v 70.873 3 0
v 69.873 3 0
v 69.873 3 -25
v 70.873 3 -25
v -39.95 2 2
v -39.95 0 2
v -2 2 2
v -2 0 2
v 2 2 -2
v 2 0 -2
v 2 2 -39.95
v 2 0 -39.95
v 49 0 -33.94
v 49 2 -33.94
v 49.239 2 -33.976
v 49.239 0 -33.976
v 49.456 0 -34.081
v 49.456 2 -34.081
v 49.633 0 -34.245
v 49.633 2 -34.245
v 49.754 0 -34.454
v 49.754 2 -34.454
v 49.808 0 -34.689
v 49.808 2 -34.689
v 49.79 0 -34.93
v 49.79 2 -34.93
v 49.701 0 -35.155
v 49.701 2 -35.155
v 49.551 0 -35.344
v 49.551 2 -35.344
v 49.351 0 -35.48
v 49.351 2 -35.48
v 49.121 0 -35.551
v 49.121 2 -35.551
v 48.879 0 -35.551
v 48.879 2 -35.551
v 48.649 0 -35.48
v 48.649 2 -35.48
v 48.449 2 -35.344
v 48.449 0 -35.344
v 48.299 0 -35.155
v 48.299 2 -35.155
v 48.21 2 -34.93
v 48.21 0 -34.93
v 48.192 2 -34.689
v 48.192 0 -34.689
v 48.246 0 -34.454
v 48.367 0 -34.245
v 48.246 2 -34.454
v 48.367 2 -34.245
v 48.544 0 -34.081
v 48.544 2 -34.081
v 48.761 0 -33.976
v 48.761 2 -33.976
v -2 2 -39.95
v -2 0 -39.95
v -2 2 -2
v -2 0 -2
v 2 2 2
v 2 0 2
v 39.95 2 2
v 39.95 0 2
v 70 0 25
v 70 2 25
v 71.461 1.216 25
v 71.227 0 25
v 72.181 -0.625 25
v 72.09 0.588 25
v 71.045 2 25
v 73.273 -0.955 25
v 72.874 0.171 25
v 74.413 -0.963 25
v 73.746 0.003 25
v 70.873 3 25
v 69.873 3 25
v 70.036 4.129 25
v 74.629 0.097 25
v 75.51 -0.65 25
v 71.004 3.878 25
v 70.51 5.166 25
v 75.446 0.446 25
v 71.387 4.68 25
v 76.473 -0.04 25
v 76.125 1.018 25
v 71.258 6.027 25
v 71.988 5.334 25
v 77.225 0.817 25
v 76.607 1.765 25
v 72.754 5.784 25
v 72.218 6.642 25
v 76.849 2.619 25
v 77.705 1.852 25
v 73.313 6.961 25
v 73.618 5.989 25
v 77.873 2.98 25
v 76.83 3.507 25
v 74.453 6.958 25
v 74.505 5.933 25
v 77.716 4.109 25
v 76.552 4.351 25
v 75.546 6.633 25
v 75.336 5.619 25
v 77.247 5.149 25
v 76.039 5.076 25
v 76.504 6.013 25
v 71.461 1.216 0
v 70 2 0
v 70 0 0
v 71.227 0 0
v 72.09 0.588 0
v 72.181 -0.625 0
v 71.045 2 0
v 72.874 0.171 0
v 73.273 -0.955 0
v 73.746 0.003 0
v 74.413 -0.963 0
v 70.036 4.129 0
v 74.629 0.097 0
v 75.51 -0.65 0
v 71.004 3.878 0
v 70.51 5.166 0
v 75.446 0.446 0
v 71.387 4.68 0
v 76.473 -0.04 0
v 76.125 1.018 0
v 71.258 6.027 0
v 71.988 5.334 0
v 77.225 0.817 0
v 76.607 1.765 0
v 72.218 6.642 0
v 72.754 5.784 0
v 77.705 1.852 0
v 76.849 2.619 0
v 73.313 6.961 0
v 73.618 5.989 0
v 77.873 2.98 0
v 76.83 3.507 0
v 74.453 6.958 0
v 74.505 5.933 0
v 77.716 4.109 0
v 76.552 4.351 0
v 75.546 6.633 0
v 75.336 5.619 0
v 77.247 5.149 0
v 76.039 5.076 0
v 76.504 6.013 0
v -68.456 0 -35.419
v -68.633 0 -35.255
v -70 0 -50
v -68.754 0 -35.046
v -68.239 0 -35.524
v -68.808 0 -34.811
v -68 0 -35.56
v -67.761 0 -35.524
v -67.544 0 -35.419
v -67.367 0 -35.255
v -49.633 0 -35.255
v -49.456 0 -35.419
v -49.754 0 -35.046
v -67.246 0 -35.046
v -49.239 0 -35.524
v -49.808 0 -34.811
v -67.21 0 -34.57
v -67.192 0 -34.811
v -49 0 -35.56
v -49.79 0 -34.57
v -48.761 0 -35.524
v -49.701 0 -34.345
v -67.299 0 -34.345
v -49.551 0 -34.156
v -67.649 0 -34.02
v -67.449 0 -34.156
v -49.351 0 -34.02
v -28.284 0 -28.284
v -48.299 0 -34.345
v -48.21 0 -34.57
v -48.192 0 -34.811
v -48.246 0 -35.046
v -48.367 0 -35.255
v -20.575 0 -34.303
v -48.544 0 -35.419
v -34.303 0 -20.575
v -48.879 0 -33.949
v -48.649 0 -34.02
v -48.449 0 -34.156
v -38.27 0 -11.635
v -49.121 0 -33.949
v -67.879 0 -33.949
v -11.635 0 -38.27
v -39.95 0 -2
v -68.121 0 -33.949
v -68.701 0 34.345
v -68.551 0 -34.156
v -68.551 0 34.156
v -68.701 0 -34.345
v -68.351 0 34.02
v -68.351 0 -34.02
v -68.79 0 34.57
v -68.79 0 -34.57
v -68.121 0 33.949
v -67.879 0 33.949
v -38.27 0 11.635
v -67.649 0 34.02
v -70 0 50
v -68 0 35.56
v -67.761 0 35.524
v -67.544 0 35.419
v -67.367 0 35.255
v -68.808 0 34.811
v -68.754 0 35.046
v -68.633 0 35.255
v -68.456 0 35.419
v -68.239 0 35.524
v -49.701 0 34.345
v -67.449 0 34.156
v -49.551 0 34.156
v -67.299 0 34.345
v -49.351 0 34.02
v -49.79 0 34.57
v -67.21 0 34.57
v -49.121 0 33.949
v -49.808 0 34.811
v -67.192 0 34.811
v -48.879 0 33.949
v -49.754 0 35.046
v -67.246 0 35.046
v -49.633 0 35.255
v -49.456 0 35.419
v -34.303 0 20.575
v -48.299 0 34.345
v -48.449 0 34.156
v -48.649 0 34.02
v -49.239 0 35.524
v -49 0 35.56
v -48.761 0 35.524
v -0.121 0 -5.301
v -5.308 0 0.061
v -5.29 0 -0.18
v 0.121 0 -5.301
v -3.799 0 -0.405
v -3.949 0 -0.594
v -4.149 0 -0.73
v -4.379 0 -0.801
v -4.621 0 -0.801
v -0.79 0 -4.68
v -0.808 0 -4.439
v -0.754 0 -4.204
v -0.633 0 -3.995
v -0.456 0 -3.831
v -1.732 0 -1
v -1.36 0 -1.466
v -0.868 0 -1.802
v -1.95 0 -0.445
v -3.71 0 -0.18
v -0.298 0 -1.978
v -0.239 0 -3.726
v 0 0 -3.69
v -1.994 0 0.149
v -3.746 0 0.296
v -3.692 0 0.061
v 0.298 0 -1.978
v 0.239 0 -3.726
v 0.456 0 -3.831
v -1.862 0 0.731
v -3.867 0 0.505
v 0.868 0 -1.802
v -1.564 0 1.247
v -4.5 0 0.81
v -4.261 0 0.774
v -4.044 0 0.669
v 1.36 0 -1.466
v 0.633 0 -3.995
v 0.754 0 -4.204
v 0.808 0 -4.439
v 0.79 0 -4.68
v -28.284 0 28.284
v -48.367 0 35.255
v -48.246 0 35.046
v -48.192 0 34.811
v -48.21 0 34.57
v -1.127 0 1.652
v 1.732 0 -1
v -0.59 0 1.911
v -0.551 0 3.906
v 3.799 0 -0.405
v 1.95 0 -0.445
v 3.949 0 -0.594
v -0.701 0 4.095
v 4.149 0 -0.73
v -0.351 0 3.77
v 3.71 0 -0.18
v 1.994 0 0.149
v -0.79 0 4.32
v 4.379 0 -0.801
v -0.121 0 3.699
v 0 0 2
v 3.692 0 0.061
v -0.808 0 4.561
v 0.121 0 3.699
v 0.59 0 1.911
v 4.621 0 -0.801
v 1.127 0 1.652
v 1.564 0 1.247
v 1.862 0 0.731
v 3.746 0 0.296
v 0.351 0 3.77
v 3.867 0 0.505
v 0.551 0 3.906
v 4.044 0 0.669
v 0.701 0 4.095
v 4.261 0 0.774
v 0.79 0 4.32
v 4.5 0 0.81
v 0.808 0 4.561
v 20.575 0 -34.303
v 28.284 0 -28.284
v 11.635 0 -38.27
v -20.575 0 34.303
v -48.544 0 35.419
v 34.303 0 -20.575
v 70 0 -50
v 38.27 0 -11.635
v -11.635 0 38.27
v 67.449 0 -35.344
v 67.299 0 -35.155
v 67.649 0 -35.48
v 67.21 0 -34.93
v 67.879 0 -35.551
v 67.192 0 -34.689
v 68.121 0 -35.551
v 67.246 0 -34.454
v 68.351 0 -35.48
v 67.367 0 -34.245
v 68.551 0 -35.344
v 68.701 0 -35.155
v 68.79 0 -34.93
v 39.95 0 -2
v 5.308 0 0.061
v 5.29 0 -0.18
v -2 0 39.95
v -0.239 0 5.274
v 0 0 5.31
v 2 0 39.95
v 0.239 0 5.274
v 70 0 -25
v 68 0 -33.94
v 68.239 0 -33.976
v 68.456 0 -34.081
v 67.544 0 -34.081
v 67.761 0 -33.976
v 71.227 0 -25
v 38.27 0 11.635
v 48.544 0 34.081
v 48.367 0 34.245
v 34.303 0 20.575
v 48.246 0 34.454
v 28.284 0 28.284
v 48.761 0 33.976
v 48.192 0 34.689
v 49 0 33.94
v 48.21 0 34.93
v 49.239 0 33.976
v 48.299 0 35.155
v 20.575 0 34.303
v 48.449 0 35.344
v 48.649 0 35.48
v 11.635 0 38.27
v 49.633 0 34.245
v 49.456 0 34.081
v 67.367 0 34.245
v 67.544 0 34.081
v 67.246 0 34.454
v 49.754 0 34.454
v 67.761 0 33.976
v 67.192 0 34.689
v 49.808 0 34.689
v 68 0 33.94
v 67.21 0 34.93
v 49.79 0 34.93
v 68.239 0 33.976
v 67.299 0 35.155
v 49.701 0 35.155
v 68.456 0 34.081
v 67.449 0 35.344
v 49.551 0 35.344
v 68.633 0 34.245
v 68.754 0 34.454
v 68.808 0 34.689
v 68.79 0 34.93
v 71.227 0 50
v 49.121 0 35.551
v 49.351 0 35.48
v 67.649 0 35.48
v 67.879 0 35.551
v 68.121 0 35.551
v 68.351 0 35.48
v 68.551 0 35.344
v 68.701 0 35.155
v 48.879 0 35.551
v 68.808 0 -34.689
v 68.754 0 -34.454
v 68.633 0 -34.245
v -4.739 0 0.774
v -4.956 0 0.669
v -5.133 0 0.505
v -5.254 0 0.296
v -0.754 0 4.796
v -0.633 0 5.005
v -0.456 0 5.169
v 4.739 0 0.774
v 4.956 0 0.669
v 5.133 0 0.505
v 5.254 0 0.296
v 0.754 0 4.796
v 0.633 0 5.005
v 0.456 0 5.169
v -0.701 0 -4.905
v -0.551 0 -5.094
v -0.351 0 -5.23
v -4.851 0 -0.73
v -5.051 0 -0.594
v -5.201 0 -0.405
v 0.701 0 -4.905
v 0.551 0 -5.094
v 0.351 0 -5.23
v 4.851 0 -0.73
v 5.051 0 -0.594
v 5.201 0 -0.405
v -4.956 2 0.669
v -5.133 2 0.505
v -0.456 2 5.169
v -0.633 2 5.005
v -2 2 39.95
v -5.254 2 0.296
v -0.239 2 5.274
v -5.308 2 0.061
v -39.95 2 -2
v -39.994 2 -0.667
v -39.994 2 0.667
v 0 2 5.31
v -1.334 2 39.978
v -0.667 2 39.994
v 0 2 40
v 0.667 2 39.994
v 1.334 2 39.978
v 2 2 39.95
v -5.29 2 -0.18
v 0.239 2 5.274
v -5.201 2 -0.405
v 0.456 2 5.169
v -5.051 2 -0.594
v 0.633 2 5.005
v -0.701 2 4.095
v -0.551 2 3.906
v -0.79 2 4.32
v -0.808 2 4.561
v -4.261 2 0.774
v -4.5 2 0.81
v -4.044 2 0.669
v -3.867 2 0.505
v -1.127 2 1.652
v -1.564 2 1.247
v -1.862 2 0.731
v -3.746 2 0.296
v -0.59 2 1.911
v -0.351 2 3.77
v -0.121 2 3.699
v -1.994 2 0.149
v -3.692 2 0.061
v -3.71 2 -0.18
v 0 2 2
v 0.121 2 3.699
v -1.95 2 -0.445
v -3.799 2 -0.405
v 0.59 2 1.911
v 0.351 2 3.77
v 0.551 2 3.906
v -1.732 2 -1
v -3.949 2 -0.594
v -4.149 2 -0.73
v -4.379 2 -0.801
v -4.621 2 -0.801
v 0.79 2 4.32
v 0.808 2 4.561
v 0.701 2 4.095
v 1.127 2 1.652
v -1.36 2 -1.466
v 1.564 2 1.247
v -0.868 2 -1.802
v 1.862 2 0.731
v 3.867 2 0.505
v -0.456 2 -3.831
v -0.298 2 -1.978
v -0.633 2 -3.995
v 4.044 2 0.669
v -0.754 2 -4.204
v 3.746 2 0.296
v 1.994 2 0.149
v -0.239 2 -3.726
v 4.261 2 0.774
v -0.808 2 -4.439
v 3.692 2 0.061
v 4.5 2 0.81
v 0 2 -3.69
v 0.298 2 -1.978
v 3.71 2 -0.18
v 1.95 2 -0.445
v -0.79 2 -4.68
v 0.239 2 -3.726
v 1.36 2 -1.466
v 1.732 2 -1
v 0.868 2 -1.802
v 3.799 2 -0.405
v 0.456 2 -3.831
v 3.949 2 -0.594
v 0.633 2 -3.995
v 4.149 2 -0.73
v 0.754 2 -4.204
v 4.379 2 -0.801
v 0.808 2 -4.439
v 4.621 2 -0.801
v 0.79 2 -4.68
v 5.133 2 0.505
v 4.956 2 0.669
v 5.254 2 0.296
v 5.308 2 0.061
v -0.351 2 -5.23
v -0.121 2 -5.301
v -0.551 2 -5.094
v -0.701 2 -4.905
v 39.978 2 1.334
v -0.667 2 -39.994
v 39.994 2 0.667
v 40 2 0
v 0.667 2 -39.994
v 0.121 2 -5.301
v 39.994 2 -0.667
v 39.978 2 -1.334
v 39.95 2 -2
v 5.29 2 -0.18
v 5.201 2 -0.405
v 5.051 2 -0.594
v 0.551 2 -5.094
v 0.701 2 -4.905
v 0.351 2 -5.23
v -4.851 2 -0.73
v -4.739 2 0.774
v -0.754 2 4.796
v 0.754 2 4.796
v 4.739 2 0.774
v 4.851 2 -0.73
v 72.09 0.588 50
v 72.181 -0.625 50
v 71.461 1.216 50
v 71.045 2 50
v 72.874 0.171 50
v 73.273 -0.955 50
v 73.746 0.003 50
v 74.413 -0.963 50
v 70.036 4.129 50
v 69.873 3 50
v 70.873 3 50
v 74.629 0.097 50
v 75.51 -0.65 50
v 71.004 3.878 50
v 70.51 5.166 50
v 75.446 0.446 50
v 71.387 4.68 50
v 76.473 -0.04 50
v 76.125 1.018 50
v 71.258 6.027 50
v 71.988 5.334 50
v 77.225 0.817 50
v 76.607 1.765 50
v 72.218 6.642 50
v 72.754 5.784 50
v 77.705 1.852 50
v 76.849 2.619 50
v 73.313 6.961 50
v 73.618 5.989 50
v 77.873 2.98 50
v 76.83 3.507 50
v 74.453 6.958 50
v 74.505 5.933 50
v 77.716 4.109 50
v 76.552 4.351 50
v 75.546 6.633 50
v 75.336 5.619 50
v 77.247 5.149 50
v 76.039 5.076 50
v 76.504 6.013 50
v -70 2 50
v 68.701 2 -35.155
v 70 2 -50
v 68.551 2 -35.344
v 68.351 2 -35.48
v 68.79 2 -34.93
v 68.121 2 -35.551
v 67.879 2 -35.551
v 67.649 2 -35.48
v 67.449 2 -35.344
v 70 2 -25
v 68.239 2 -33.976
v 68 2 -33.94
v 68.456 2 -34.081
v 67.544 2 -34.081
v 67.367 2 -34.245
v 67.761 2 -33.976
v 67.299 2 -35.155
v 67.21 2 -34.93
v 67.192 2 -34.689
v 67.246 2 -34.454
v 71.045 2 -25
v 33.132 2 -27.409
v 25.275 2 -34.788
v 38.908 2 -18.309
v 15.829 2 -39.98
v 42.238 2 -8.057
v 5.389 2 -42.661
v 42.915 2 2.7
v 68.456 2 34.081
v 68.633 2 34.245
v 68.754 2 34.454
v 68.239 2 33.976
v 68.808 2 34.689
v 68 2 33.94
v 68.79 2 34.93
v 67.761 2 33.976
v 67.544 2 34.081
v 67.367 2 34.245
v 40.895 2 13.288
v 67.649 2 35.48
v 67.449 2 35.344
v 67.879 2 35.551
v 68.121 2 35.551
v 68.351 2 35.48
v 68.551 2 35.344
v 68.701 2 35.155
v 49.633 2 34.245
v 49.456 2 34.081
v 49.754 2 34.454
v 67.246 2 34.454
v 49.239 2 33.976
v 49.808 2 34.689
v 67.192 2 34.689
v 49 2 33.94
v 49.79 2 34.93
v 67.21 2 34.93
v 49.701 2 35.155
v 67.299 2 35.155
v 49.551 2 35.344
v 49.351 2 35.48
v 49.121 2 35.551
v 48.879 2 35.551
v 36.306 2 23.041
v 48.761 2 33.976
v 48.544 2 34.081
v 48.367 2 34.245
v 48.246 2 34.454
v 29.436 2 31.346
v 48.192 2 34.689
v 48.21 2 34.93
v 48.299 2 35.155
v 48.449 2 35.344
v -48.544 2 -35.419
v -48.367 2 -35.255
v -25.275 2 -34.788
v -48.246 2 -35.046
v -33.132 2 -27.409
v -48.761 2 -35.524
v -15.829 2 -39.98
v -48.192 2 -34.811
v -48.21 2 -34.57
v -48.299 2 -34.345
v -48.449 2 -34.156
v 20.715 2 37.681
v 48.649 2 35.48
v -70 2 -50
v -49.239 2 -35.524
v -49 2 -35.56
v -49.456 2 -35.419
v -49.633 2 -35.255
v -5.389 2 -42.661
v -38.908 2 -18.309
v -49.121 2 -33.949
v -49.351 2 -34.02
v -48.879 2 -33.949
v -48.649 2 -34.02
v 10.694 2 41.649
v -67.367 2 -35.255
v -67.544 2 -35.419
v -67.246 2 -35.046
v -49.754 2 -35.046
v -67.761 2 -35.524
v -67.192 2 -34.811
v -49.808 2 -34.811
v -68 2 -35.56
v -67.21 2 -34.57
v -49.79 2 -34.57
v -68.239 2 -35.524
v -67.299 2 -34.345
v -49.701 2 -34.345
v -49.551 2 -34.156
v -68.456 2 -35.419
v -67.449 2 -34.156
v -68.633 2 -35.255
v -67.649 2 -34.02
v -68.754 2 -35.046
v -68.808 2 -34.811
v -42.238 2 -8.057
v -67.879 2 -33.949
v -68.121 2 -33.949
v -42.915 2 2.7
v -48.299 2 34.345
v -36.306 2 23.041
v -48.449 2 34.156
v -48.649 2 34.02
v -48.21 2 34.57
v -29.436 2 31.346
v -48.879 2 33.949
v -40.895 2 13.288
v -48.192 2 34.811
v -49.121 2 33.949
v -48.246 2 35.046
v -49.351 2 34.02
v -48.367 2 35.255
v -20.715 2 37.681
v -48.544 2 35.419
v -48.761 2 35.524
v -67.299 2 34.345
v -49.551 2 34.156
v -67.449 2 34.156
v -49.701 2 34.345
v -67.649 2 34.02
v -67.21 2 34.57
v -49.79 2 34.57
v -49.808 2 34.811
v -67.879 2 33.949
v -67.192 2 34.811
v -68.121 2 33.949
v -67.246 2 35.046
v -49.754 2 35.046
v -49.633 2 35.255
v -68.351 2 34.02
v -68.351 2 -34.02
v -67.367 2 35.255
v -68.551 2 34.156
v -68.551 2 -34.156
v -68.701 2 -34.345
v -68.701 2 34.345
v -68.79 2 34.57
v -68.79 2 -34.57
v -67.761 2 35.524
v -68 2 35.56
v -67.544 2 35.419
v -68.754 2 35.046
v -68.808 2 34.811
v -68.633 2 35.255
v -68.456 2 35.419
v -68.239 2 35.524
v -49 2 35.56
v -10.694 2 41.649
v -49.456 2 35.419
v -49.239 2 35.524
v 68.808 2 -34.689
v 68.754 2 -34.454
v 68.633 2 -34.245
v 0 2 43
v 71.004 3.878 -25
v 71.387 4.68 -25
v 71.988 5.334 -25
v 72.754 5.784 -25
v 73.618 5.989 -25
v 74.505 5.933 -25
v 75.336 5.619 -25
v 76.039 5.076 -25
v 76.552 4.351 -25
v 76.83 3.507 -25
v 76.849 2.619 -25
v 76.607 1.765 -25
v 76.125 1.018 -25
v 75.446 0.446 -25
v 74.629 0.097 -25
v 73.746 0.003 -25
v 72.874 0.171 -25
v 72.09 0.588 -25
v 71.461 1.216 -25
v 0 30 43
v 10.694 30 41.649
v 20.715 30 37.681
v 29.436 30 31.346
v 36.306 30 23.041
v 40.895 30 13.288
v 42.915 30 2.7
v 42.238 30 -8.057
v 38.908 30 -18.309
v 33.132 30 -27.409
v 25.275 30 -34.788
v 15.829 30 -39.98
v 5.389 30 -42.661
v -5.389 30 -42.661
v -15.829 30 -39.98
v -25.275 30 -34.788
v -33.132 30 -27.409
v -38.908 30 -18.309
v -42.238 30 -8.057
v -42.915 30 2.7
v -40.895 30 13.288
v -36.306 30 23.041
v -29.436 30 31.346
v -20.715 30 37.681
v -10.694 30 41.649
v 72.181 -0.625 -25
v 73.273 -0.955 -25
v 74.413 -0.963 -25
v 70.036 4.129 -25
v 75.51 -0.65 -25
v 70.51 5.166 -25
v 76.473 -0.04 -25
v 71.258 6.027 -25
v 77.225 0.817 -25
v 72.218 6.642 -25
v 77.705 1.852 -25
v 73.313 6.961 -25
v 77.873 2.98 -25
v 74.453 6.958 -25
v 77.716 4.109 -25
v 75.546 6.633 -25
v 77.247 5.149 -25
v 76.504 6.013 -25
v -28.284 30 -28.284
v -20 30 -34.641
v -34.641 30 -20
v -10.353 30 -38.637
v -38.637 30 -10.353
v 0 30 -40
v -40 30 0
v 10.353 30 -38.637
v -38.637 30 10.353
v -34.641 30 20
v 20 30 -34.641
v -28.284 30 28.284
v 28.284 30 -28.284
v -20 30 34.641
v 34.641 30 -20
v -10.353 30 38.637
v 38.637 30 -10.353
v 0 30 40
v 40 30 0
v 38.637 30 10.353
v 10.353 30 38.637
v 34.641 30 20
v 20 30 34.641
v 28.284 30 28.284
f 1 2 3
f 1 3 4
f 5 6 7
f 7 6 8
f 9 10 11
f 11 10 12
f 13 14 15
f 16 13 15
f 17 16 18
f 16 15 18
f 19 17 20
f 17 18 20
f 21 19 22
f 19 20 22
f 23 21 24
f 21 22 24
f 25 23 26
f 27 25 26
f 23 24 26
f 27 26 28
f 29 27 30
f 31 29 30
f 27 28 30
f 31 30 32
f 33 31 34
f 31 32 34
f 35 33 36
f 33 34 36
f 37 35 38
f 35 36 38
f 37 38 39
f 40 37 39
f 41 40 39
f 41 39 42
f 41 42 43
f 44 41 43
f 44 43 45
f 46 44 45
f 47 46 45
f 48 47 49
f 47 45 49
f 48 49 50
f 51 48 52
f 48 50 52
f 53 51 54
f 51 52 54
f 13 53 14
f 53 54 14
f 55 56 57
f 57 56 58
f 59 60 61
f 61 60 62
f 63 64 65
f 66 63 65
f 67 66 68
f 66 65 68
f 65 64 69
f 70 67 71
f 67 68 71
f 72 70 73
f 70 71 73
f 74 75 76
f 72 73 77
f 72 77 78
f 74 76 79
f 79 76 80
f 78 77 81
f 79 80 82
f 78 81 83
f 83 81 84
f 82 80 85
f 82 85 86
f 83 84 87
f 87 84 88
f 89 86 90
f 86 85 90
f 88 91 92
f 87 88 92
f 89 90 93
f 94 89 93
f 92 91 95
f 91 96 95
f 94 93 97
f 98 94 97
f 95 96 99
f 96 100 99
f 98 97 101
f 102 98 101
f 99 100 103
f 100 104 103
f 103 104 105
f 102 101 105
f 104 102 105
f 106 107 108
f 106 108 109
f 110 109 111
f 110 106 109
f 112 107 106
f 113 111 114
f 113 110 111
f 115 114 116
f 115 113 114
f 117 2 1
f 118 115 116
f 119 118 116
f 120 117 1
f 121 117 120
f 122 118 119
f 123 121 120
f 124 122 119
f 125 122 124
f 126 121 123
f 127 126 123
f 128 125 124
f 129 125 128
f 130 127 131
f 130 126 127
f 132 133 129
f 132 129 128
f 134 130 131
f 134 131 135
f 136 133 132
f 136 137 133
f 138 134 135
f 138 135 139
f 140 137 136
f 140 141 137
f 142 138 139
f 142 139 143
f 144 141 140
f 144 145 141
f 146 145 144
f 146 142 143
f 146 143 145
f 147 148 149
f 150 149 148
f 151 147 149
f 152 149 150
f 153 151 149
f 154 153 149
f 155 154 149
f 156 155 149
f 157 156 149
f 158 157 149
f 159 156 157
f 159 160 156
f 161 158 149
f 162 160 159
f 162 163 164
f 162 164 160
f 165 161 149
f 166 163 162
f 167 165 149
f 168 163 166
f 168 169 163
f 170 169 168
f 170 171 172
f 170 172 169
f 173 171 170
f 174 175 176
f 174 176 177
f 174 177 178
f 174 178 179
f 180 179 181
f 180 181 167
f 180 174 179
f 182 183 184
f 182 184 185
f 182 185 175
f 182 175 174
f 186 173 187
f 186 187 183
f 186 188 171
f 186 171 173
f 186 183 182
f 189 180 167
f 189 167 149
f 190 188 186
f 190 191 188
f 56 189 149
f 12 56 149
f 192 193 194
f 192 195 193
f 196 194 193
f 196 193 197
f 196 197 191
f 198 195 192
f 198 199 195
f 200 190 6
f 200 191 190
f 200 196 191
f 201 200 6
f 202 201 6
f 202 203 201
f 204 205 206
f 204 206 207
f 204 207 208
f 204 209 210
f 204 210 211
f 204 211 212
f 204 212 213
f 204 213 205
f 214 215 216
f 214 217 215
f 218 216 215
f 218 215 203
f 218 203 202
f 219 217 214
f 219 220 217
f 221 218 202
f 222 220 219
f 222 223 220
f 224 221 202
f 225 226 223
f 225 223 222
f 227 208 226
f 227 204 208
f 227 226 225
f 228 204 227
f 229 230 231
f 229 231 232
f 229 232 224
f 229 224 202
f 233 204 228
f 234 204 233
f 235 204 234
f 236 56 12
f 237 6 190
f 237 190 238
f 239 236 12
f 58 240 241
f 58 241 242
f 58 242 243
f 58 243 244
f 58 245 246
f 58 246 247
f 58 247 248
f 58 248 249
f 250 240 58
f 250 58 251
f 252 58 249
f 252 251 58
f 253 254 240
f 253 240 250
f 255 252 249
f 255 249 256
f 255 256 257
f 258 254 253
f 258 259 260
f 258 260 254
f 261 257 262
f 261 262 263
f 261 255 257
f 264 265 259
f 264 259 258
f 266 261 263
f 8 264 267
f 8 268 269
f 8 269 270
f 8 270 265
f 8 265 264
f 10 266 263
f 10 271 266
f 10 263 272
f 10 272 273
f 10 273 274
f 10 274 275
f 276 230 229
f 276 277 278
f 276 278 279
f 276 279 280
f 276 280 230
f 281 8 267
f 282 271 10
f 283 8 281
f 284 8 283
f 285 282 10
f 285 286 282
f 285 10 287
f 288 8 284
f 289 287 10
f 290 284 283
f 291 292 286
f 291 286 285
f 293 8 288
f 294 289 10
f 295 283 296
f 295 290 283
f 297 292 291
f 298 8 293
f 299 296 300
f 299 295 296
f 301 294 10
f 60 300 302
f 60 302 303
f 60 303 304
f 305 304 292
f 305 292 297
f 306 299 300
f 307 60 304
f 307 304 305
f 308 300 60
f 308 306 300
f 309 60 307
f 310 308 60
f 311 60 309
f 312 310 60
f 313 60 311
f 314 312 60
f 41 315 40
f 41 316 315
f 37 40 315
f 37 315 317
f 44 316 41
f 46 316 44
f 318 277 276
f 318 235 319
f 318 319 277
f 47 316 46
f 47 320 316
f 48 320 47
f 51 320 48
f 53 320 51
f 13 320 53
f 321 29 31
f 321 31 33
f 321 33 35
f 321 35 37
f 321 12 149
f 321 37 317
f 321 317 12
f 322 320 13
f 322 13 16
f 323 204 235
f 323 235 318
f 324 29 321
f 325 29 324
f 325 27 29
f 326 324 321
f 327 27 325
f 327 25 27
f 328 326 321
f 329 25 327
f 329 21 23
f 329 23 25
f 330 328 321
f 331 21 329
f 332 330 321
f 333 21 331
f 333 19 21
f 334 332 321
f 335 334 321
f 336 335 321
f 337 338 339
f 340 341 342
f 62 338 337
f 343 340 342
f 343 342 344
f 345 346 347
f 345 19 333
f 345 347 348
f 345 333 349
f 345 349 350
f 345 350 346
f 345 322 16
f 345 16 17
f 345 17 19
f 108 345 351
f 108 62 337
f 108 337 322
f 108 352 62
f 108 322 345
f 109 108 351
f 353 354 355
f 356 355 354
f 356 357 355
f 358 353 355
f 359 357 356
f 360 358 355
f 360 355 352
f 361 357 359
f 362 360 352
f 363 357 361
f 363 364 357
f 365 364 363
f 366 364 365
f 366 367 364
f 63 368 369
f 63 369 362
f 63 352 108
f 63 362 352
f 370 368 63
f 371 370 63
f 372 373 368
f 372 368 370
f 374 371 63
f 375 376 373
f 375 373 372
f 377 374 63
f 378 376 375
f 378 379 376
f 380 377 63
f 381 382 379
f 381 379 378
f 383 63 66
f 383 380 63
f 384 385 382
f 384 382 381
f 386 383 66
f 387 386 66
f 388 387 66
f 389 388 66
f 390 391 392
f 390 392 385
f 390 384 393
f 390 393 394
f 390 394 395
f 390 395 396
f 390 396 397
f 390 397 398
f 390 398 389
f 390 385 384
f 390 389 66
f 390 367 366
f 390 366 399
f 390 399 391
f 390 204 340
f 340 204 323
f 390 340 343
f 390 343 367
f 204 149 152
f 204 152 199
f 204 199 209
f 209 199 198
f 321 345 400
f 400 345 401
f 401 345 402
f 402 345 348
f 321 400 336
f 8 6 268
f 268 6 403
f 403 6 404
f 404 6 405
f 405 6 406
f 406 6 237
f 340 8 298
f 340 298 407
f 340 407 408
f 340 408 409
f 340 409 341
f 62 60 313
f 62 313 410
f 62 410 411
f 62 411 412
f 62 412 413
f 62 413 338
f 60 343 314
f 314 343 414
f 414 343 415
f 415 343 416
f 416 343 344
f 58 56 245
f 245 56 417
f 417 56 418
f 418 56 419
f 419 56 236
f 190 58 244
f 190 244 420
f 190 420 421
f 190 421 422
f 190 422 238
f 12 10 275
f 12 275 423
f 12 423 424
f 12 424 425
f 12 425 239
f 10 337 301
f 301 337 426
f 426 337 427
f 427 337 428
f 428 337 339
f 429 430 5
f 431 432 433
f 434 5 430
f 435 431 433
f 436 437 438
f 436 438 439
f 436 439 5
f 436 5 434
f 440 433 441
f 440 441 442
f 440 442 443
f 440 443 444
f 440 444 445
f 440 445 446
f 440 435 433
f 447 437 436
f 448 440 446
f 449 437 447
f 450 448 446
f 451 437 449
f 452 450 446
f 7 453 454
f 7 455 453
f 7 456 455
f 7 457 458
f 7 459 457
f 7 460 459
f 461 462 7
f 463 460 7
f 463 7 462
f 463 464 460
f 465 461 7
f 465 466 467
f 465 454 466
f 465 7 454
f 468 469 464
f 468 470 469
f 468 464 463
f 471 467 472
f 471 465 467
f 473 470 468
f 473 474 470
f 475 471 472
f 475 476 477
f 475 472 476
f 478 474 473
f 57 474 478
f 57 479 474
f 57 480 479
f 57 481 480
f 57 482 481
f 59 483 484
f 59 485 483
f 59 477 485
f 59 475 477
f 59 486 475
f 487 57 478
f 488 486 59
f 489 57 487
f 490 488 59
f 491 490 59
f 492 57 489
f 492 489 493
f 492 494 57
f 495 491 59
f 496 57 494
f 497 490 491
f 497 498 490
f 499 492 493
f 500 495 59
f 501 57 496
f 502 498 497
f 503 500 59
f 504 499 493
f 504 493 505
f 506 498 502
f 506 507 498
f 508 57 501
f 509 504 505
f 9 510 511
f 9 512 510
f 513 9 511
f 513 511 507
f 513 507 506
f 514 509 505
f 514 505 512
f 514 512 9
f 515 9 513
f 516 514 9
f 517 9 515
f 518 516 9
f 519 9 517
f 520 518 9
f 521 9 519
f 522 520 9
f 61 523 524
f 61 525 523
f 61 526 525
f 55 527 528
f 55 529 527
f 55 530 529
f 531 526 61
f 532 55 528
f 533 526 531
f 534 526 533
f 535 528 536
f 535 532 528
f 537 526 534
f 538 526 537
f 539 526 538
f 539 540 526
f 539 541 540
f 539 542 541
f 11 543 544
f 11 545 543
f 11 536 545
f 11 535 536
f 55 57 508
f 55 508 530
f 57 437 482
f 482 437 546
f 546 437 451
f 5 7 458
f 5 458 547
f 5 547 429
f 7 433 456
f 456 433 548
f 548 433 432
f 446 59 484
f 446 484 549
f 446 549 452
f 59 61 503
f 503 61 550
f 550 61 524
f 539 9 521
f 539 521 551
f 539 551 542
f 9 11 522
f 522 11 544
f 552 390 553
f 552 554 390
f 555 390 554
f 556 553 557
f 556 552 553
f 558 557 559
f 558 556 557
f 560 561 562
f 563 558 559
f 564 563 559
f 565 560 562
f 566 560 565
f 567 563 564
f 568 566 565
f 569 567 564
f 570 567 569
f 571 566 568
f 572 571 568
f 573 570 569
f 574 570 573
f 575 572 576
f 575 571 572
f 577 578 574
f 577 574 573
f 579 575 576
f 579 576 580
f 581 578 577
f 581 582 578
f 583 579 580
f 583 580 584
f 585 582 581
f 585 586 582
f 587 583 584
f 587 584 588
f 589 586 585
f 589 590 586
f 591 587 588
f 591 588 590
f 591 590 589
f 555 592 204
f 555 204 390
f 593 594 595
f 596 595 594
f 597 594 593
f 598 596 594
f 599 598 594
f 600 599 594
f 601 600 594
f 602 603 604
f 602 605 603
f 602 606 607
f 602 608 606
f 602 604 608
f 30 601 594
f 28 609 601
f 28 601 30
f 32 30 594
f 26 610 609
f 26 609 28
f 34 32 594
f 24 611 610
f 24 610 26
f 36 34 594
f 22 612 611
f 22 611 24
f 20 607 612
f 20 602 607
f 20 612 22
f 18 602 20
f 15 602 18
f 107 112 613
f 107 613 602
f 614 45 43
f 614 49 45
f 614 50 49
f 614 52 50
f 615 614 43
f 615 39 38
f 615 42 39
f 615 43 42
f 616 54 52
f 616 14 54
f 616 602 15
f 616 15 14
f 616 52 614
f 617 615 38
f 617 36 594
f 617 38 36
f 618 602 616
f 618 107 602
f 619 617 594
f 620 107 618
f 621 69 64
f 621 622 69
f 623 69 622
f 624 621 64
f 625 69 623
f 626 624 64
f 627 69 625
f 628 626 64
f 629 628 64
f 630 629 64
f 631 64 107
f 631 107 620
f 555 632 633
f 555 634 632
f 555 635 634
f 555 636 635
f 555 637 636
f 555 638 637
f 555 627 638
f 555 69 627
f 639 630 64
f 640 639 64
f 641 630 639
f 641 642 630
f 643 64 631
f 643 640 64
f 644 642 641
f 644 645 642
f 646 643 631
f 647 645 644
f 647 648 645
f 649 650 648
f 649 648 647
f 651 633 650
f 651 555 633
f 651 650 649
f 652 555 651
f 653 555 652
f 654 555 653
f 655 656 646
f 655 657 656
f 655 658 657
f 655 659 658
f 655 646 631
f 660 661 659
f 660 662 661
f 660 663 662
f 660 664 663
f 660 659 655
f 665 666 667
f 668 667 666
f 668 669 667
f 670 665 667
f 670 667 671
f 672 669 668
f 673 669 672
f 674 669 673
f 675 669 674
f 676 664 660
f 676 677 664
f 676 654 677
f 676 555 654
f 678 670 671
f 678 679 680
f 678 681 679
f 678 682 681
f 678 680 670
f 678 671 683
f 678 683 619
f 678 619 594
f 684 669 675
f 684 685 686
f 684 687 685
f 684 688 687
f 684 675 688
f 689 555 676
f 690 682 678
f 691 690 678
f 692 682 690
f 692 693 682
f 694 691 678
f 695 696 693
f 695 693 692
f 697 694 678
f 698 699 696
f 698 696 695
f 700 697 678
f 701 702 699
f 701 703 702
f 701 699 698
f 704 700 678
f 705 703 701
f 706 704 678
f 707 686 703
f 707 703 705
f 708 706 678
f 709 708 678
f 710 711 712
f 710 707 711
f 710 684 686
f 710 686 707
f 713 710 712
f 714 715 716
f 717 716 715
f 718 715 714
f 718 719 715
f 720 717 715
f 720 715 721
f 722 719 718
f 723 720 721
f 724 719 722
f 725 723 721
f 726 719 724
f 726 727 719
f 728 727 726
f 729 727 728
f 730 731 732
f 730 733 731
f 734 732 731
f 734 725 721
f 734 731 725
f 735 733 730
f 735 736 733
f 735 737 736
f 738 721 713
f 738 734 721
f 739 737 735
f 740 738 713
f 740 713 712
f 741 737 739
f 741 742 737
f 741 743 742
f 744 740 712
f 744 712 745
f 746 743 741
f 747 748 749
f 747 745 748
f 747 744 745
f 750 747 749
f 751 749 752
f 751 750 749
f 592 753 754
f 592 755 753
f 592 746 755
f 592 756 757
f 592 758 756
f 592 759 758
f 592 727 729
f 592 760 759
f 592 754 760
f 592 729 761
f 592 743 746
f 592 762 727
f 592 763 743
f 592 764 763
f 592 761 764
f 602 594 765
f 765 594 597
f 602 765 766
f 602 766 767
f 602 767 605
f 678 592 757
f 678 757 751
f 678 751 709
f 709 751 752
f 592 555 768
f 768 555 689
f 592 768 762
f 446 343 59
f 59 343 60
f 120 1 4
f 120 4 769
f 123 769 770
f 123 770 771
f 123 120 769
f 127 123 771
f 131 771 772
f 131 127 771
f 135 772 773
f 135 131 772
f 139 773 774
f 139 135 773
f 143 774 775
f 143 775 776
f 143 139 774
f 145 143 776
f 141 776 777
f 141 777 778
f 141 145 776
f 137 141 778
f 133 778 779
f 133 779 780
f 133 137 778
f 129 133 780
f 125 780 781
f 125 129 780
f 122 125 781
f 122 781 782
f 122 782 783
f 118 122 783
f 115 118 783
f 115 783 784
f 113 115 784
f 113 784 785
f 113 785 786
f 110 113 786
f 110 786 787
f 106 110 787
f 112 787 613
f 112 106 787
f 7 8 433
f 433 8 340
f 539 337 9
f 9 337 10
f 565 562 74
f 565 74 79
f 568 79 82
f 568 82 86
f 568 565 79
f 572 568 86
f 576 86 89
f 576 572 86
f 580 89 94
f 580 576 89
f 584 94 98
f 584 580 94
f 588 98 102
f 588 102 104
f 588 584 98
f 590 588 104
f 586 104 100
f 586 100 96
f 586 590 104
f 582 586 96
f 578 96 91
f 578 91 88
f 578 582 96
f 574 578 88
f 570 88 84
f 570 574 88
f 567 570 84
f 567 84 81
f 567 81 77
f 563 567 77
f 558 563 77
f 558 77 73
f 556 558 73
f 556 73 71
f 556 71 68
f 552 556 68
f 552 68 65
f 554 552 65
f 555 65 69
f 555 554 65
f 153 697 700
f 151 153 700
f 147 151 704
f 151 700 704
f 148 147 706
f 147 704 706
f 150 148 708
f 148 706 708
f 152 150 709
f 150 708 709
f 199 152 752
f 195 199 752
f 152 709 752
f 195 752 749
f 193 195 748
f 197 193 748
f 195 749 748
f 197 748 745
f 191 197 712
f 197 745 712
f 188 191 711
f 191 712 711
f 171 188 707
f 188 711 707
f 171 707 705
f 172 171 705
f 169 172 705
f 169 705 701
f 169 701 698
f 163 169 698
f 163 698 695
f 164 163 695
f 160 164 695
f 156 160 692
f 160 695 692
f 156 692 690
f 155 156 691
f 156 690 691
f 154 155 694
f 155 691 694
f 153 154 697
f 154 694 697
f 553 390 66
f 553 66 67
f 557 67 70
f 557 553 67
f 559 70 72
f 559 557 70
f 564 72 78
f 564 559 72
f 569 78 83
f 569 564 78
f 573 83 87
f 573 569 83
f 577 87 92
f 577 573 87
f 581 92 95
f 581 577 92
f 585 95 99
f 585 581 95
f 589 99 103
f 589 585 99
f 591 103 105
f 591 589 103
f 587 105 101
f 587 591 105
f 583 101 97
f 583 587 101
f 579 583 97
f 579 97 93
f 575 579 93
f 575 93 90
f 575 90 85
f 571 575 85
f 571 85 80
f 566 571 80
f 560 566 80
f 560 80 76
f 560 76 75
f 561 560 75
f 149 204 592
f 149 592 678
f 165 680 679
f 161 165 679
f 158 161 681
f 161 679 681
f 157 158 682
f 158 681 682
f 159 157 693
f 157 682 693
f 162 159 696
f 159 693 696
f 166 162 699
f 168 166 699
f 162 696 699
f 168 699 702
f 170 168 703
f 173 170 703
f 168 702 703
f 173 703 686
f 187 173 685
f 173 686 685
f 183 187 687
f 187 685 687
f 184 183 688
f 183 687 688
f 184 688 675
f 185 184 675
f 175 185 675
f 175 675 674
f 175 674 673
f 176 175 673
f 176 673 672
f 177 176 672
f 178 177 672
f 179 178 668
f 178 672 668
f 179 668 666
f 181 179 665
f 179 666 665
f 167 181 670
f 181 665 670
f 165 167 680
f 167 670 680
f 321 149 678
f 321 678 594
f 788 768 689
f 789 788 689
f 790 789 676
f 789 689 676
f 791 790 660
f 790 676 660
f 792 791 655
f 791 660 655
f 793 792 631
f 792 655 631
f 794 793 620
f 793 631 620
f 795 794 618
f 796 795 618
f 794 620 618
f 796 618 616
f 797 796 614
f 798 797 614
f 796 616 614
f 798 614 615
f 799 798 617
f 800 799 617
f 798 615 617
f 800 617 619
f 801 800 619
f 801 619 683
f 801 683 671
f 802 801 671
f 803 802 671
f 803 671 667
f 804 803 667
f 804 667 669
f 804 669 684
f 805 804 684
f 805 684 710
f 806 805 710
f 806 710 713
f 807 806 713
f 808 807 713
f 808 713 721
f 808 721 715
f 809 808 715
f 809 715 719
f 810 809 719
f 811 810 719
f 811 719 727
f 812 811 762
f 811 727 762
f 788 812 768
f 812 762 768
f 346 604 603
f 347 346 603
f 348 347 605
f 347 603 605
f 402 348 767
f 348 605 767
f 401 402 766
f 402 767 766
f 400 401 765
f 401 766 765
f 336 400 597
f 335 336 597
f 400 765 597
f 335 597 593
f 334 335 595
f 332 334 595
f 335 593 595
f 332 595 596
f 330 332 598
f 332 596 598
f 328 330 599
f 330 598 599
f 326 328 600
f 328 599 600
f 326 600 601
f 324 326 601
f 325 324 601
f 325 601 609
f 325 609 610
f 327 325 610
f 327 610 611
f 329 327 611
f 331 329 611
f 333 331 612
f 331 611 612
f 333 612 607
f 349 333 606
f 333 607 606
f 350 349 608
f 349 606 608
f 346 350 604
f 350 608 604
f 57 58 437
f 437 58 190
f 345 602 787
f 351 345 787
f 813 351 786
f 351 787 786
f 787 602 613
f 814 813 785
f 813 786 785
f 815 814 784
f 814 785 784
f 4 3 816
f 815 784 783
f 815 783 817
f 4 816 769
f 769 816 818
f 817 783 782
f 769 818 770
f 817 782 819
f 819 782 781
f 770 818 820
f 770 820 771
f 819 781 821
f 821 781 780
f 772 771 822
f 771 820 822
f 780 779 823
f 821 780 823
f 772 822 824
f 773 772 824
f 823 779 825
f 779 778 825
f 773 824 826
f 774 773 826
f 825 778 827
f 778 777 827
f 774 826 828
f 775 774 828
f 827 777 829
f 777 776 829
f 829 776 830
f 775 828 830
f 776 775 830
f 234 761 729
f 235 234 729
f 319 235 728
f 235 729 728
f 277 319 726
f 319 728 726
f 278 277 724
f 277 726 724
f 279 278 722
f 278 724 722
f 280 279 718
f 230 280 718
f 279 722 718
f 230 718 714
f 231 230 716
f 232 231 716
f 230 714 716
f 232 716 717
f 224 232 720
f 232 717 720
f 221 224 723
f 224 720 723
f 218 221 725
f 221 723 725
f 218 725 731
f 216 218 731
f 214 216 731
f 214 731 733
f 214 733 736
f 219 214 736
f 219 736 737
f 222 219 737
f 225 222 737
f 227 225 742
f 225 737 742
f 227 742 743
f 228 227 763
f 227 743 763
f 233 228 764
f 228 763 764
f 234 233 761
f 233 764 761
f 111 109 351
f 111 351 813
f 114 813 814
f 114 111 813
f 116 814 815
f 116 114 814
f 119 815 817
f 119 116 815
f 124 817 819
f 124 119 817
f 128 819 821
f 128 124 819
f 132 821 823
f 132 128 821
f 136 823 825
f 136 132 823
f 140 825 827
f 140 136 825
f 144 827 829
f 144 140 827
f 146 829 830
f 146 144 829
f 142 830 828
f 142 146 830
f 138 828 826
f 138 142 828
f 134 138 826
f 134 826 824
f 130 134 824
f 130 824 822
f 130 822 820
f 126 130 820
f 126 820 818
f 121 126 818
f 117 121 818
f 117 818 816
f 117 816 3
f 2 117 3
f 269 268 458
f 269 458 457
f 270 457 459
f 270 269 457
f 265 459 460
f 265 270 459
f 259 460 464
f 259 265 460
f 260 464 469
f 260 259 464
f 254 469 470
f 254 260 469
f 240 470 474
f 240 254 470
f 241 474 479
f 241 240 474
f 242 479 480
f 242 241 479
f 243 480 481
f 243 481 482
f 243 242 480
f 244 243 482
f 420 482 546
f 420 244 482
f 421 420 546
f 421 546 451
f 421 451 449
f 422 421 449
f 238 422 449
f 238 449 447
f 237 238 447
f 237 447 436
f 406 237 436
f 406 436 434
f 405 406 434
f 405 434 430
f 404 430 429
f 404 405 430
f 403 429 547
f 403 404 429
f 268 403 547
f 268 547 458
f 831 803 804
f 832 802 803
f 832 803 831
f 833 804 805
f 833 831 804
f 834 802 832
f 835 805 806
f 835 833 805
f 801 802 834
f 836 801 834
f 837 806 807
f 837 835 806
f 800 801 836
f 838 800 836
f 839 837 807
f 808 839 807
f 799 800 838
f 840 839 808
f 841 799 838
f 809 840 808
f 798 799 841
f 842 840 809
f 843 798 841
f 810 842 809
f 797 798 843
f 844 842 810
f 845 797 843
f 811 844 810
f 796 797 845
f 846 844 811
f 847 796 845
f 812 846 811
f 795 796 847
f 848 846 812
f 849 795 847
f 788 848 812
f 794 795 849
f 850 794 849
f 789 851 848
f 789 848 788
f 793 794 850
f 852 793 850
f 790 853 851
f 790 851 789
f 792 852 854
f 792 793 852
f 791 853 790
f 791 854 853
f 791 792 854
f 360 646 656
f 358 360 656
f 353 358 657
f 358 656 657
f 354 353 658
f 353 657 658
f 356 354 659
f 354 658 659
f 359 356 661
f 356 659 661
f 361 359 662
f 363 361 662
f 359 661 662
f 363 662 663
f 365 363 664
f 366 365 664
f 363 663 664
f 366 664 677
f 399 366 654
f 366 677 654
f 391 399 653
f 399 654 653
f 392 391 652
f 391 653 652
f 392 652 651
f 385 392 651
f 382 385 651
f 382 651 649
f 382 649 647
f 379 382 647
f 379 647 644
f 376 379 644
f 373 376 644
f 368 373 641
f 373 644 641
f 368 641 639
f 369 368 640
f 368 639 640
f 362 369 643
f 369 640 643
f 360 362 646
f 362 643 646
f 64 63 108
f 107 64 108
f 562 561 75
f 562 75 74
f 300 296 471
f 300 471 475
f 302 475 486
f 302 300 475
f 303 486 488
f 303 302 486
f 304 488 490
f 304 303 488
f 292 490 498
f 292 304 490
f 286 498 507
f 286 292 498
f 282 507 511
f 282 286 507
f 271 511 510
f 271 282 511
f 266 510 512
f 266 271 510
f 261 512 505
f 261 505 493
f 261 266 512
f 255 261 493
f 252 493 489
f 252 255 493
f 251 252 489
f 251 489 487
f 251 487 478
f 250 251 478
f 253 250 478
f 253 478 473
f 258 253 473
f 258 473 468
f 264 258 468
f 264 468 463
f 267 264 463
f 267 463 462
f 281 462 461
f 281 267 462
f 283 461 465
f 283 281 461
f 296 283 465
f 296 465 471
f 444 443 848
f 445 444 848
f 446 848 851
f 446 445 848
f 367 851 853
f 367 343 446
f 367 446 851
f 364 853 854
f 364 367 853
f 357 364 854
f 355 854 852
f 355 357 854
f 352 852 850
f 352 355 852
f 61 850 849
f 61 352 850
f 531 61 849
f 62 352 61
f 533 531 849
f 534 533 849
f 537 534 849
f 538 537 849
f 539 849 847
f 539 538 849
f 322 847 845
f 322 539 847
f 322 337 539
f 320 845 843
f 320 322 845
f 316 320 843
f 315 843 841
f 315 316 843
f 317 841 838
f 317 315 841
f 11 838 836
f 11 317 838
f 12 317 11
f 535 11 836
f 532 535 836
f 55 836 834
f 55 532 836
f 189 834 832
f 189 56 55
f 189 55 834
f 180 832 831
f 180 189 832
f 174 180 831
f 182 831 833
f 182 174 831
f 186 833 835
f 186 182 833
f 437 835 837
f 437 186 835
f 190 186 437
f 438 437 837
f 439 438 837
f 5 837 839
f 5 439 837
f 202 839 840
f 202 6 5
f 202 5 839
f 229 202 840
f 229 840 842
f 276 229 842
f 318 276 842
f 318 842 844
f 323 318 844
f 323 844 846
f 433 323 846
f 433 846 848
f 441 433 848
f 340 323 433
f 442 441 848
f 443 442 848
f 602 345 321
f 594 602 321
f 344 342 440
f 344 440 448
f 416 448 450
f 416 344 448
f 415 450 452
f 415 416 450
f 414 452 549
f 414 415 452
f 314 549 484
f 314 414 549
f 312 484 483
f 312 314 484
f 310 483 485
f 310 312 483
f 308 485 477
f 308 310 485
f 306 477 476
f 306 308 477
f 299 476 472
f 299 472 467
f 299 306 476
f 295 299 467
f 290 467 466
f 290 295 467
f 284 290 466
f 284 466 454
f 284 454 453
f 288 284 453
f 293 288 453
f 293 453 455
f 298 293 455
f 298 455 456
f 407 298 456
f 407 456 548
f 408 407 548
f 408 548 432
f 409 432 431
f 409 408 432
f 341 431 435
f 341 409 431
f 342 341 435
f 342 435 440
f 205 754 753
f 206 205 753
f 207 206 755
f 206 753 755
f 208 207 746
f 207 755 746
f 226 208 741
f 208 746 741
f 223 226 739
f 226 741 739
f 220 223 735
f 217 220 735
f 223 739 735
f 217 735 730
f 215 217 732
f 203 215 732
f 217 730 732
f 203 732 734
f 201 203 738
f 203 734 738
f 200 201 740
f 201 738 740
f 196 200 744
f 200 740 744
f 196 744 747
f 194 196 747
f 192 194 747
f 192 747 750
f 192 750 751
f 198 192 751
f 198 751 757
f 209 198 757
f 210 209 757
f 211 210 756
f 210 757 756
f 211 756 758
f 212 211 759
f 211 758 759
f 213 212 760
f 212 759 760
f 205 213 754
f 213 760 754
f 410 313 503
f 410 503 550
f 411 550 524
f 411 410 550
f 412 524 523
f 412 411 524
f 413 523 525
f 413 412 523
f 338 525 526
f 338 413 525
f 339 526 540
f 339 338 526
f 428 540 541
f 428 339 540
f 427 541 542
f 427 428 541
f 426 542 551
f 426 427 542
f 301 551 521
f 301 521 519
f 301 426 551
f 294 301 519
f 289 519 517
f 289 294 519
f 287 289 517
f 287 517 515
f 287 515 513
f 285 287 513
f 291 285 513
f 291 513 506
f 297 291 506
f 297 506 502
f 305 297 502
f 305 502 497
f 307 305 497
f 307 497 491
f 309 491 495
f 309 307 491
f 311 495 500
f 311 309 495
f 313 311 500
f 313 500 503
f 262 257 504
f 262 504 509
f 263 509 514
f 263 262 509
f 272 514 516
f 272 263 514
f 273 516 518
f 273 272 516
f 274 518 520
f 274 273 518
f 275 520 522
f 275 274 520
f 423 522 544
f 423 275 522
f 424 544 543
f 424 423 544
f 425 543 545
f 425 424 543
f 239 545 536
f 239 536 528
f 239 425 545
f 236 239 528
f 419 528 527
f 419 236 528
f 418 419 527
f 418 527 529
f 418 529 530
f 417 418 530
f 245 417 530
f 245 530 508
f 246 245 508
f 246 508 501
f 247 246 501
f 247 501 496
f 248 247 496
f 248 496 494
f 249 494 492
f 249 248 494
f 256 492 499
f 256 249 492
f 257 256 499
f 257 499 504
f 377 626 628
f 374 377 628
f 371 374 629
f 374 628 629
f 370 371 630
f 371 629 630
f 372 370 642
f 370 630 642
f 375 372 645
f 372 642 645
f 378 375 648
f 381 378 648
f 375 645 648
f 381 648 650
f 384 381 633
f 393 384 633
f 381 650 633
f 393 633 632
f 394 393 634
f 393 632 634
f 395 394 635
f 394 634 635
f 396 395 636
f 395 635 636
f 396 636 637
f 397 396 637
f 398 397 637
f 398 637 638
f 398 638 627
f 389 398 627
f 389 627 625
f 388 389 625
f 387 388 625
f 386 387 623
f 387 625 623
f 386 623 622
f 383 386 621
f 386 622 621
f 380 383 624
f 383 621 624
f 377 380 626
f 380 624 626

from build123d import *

# Parameters (mm, degrees)
CROQUIS1_R              = 43
CROQUIS1_R_2            = 40
SALIENTE_EXTRUIR1_DEPTH = 30
CROQUIS3_R              = 0.81
CROQUIS3_R_2            = 2
SALIENTE_EXTRUIR2_DEPTH = 2
CROQUIS4_W              = 140
CROQUIS4_H              = 100
CROQUIS4_R              = 43
SALIENTE_EXTRUIR3_DEPTH = 2
CROQUIS5_R              = 0.81
CORTAR_EXTRUIR1_DEPTH   = 2
SALIENTE_EXTRUIR7_DEPTH = 25
MATRIZL1_COUNT          = 2
MATRIZL1_PITCH          = 50


with BuildPart() as part:
    # Croquis1 → Saliente-Extruir1 (new body)
    with BuildSketch(Plane(origin=(0, 0, 0), x_dir=(1, 0, 0), z_dir=(0, 1, 0))):
        with Locations(Location((0, 0, 0), (0, 0, 270))):
            Circle(CROQUIS1_R)
        with Locations(Location((0, 0, 0), (0, 0, 270))):
            Circle(CROQUIS1_R_2, mode=Mode.SUBTRACT)
    extrude(amount=SALIENTE_EXTRUIR1_DEPTH)

    # Croquis3 → Saliente-Extruir2 (add)
    with BuildSketch(Plane(origin=(0, 0, 0), x_dir=(1, 0, 0), z_dir=(0, 1, 0))):
        with BuildLine():
            Line((-2, 39.949968711), (-2, 2))
            Line((-2, 2), (-39.949968711, 2))
            ThreePointArc((-39.949968711, 2), (-40, 0), (-39.949968711, -2))
            Line((-39.949968711, -2), (-2, -2))
            Line((-2, -2), (-2, -39.949968711))
            ThreePointArc((-2, -39.949968711), (0, -40), (2, -39.949968711))
            Line((2, -39.949968711), (2, -2))
            Line((2, -2), (39.949968711, -2))
            ThreePointArc((39.949968711, -2), (39.987490222, -1.000312842), (40, 0))
            ThreePointArc((40, 0), (39.987490222, 1.000312842), (39.949968711, 2))
            Line((39.949968711, 2), (2, 2))
            Line((2, 2), (2, 39.949968711))
            ThreePointArc((2, 39.949968711), (0, 40), (-2, 39.949968711))
        make_face()
        with Locations(Location((0, -4.5, 0), (0, 0, 270))):
            Circle(CROQUIS3_R, mode=Mode.SUBTRACT)
        with Locations(Location((-4.5, 0, 0), (0, 0, 270))):
            Circle(CROQUIS3_R, mode=Mode.SUBTRACT)
        with Locations(Location((0, 0, 0), (0, 0, 270))):
            Circle(CROQUIS3_R_2, mode=Mode.SUBTRACT)
        with Locations(Location((4.5, 0, 0), (0, 0, 270))):
            Circle(CROQUIS3_R, mode=Mode.SUBTRACT)
        with Locations(Location((0, 4.5, 0), (0, 0, 270))):
            Circle(CROQUIS3_R, mode=Mode.SUBTRACT)
    extrude(amount=SALIENTE_EXTRUIR2_DEPTH)

    # Croquis4 → Saliente-Extruir3 (add)
    with BuildSketch(Plane(origin=(0, 0, 0), x_dir=(1, 0, 0), z_dir=(0, 1, 0))):
        Rectangle(CROQUIS4_W, CROQUIS4_H)
        with Locations(Location((0, 0, 0), (0, 0, 90))):
            Circle(CROQUIS4_R, mode=Mode.SUBTRACT)
    extrude(amount=SALIENTE_EXTRUIR3_DEPTH)

    # Croquis5 → Cortar-Extruir1 (cut)
    with BuildSketch(Plane(origin=(0, 2, 0), x_dir=(1, 0, 0), z_dir=(0, 1, 0))):
        with Locations(Location((-68, -34.75, 0), (0, 0, 270))):
            Circle(CROQUIS5_R)
        with Locations(Location((-49, -34.75, 0), (0, 0, 270))):
            Circle(CROQUIS5_R)
        with Locations(Location((-49, 34.75, 0), (0, 0, 90))):
            Circle(CROQUIS5_R)
        with Locations(Location((-68, 34.75, 0), (0, 0, 90))):
            Circle(CROQUIS5_R)
        with Locations(Location((68, 34.75, 0), (0, 0, 270))):
            Circle(CROQUIS5_R)
        with Locations(Location((49, 34.75, 0), (0, 0, 270))):
            Circle(CROQUIS5_R)
        with Locations(Location((49, -34.75, 0), (0, 0, 90))):
            Circle(CROQUIS5_R)
        with Locations(Location((68, -34.75, 0), (0, 0, 90))):
            Circle(CROQUIS5_R)
    extrude(amount=-CORTAR_EXTRUIR1_DEPTH, mode=Mode.SUBTRACT)

    # Croquis7 → Saliente-Extruir7 (add)
    with BuildSketch(Plane.XY.offset(50)):
        with BuildLine():
            Line((70, 2), (70, 0))
            Line((70, 0), (71.227232035, 0))
            ThreePointArc((71.227232035, 0), (77.518734657, 4.645751311), (69.872983346, 3))
            Line((69.872983346, 3), (70.872983346, 3))
            ThreePointArc((70.872983346, 3), (76.829779025, 3.507305936), (71.044556221, 2))
            Line((71.044556221, 2), (70, 2))
        make_face()
    saliente_extruir7 = extrude(amount=-SALIENTE_EXTRUIR7_DEPTH)

    # MatrizL1: Saliente-Extruir7 ×2
    with Locations(*[(0, 0, -i * MATRIZL1_PITCH) for i in range(1, MATRIZL1_COUNT)]):
        add(saliente_extruir7)


solid = part.part
